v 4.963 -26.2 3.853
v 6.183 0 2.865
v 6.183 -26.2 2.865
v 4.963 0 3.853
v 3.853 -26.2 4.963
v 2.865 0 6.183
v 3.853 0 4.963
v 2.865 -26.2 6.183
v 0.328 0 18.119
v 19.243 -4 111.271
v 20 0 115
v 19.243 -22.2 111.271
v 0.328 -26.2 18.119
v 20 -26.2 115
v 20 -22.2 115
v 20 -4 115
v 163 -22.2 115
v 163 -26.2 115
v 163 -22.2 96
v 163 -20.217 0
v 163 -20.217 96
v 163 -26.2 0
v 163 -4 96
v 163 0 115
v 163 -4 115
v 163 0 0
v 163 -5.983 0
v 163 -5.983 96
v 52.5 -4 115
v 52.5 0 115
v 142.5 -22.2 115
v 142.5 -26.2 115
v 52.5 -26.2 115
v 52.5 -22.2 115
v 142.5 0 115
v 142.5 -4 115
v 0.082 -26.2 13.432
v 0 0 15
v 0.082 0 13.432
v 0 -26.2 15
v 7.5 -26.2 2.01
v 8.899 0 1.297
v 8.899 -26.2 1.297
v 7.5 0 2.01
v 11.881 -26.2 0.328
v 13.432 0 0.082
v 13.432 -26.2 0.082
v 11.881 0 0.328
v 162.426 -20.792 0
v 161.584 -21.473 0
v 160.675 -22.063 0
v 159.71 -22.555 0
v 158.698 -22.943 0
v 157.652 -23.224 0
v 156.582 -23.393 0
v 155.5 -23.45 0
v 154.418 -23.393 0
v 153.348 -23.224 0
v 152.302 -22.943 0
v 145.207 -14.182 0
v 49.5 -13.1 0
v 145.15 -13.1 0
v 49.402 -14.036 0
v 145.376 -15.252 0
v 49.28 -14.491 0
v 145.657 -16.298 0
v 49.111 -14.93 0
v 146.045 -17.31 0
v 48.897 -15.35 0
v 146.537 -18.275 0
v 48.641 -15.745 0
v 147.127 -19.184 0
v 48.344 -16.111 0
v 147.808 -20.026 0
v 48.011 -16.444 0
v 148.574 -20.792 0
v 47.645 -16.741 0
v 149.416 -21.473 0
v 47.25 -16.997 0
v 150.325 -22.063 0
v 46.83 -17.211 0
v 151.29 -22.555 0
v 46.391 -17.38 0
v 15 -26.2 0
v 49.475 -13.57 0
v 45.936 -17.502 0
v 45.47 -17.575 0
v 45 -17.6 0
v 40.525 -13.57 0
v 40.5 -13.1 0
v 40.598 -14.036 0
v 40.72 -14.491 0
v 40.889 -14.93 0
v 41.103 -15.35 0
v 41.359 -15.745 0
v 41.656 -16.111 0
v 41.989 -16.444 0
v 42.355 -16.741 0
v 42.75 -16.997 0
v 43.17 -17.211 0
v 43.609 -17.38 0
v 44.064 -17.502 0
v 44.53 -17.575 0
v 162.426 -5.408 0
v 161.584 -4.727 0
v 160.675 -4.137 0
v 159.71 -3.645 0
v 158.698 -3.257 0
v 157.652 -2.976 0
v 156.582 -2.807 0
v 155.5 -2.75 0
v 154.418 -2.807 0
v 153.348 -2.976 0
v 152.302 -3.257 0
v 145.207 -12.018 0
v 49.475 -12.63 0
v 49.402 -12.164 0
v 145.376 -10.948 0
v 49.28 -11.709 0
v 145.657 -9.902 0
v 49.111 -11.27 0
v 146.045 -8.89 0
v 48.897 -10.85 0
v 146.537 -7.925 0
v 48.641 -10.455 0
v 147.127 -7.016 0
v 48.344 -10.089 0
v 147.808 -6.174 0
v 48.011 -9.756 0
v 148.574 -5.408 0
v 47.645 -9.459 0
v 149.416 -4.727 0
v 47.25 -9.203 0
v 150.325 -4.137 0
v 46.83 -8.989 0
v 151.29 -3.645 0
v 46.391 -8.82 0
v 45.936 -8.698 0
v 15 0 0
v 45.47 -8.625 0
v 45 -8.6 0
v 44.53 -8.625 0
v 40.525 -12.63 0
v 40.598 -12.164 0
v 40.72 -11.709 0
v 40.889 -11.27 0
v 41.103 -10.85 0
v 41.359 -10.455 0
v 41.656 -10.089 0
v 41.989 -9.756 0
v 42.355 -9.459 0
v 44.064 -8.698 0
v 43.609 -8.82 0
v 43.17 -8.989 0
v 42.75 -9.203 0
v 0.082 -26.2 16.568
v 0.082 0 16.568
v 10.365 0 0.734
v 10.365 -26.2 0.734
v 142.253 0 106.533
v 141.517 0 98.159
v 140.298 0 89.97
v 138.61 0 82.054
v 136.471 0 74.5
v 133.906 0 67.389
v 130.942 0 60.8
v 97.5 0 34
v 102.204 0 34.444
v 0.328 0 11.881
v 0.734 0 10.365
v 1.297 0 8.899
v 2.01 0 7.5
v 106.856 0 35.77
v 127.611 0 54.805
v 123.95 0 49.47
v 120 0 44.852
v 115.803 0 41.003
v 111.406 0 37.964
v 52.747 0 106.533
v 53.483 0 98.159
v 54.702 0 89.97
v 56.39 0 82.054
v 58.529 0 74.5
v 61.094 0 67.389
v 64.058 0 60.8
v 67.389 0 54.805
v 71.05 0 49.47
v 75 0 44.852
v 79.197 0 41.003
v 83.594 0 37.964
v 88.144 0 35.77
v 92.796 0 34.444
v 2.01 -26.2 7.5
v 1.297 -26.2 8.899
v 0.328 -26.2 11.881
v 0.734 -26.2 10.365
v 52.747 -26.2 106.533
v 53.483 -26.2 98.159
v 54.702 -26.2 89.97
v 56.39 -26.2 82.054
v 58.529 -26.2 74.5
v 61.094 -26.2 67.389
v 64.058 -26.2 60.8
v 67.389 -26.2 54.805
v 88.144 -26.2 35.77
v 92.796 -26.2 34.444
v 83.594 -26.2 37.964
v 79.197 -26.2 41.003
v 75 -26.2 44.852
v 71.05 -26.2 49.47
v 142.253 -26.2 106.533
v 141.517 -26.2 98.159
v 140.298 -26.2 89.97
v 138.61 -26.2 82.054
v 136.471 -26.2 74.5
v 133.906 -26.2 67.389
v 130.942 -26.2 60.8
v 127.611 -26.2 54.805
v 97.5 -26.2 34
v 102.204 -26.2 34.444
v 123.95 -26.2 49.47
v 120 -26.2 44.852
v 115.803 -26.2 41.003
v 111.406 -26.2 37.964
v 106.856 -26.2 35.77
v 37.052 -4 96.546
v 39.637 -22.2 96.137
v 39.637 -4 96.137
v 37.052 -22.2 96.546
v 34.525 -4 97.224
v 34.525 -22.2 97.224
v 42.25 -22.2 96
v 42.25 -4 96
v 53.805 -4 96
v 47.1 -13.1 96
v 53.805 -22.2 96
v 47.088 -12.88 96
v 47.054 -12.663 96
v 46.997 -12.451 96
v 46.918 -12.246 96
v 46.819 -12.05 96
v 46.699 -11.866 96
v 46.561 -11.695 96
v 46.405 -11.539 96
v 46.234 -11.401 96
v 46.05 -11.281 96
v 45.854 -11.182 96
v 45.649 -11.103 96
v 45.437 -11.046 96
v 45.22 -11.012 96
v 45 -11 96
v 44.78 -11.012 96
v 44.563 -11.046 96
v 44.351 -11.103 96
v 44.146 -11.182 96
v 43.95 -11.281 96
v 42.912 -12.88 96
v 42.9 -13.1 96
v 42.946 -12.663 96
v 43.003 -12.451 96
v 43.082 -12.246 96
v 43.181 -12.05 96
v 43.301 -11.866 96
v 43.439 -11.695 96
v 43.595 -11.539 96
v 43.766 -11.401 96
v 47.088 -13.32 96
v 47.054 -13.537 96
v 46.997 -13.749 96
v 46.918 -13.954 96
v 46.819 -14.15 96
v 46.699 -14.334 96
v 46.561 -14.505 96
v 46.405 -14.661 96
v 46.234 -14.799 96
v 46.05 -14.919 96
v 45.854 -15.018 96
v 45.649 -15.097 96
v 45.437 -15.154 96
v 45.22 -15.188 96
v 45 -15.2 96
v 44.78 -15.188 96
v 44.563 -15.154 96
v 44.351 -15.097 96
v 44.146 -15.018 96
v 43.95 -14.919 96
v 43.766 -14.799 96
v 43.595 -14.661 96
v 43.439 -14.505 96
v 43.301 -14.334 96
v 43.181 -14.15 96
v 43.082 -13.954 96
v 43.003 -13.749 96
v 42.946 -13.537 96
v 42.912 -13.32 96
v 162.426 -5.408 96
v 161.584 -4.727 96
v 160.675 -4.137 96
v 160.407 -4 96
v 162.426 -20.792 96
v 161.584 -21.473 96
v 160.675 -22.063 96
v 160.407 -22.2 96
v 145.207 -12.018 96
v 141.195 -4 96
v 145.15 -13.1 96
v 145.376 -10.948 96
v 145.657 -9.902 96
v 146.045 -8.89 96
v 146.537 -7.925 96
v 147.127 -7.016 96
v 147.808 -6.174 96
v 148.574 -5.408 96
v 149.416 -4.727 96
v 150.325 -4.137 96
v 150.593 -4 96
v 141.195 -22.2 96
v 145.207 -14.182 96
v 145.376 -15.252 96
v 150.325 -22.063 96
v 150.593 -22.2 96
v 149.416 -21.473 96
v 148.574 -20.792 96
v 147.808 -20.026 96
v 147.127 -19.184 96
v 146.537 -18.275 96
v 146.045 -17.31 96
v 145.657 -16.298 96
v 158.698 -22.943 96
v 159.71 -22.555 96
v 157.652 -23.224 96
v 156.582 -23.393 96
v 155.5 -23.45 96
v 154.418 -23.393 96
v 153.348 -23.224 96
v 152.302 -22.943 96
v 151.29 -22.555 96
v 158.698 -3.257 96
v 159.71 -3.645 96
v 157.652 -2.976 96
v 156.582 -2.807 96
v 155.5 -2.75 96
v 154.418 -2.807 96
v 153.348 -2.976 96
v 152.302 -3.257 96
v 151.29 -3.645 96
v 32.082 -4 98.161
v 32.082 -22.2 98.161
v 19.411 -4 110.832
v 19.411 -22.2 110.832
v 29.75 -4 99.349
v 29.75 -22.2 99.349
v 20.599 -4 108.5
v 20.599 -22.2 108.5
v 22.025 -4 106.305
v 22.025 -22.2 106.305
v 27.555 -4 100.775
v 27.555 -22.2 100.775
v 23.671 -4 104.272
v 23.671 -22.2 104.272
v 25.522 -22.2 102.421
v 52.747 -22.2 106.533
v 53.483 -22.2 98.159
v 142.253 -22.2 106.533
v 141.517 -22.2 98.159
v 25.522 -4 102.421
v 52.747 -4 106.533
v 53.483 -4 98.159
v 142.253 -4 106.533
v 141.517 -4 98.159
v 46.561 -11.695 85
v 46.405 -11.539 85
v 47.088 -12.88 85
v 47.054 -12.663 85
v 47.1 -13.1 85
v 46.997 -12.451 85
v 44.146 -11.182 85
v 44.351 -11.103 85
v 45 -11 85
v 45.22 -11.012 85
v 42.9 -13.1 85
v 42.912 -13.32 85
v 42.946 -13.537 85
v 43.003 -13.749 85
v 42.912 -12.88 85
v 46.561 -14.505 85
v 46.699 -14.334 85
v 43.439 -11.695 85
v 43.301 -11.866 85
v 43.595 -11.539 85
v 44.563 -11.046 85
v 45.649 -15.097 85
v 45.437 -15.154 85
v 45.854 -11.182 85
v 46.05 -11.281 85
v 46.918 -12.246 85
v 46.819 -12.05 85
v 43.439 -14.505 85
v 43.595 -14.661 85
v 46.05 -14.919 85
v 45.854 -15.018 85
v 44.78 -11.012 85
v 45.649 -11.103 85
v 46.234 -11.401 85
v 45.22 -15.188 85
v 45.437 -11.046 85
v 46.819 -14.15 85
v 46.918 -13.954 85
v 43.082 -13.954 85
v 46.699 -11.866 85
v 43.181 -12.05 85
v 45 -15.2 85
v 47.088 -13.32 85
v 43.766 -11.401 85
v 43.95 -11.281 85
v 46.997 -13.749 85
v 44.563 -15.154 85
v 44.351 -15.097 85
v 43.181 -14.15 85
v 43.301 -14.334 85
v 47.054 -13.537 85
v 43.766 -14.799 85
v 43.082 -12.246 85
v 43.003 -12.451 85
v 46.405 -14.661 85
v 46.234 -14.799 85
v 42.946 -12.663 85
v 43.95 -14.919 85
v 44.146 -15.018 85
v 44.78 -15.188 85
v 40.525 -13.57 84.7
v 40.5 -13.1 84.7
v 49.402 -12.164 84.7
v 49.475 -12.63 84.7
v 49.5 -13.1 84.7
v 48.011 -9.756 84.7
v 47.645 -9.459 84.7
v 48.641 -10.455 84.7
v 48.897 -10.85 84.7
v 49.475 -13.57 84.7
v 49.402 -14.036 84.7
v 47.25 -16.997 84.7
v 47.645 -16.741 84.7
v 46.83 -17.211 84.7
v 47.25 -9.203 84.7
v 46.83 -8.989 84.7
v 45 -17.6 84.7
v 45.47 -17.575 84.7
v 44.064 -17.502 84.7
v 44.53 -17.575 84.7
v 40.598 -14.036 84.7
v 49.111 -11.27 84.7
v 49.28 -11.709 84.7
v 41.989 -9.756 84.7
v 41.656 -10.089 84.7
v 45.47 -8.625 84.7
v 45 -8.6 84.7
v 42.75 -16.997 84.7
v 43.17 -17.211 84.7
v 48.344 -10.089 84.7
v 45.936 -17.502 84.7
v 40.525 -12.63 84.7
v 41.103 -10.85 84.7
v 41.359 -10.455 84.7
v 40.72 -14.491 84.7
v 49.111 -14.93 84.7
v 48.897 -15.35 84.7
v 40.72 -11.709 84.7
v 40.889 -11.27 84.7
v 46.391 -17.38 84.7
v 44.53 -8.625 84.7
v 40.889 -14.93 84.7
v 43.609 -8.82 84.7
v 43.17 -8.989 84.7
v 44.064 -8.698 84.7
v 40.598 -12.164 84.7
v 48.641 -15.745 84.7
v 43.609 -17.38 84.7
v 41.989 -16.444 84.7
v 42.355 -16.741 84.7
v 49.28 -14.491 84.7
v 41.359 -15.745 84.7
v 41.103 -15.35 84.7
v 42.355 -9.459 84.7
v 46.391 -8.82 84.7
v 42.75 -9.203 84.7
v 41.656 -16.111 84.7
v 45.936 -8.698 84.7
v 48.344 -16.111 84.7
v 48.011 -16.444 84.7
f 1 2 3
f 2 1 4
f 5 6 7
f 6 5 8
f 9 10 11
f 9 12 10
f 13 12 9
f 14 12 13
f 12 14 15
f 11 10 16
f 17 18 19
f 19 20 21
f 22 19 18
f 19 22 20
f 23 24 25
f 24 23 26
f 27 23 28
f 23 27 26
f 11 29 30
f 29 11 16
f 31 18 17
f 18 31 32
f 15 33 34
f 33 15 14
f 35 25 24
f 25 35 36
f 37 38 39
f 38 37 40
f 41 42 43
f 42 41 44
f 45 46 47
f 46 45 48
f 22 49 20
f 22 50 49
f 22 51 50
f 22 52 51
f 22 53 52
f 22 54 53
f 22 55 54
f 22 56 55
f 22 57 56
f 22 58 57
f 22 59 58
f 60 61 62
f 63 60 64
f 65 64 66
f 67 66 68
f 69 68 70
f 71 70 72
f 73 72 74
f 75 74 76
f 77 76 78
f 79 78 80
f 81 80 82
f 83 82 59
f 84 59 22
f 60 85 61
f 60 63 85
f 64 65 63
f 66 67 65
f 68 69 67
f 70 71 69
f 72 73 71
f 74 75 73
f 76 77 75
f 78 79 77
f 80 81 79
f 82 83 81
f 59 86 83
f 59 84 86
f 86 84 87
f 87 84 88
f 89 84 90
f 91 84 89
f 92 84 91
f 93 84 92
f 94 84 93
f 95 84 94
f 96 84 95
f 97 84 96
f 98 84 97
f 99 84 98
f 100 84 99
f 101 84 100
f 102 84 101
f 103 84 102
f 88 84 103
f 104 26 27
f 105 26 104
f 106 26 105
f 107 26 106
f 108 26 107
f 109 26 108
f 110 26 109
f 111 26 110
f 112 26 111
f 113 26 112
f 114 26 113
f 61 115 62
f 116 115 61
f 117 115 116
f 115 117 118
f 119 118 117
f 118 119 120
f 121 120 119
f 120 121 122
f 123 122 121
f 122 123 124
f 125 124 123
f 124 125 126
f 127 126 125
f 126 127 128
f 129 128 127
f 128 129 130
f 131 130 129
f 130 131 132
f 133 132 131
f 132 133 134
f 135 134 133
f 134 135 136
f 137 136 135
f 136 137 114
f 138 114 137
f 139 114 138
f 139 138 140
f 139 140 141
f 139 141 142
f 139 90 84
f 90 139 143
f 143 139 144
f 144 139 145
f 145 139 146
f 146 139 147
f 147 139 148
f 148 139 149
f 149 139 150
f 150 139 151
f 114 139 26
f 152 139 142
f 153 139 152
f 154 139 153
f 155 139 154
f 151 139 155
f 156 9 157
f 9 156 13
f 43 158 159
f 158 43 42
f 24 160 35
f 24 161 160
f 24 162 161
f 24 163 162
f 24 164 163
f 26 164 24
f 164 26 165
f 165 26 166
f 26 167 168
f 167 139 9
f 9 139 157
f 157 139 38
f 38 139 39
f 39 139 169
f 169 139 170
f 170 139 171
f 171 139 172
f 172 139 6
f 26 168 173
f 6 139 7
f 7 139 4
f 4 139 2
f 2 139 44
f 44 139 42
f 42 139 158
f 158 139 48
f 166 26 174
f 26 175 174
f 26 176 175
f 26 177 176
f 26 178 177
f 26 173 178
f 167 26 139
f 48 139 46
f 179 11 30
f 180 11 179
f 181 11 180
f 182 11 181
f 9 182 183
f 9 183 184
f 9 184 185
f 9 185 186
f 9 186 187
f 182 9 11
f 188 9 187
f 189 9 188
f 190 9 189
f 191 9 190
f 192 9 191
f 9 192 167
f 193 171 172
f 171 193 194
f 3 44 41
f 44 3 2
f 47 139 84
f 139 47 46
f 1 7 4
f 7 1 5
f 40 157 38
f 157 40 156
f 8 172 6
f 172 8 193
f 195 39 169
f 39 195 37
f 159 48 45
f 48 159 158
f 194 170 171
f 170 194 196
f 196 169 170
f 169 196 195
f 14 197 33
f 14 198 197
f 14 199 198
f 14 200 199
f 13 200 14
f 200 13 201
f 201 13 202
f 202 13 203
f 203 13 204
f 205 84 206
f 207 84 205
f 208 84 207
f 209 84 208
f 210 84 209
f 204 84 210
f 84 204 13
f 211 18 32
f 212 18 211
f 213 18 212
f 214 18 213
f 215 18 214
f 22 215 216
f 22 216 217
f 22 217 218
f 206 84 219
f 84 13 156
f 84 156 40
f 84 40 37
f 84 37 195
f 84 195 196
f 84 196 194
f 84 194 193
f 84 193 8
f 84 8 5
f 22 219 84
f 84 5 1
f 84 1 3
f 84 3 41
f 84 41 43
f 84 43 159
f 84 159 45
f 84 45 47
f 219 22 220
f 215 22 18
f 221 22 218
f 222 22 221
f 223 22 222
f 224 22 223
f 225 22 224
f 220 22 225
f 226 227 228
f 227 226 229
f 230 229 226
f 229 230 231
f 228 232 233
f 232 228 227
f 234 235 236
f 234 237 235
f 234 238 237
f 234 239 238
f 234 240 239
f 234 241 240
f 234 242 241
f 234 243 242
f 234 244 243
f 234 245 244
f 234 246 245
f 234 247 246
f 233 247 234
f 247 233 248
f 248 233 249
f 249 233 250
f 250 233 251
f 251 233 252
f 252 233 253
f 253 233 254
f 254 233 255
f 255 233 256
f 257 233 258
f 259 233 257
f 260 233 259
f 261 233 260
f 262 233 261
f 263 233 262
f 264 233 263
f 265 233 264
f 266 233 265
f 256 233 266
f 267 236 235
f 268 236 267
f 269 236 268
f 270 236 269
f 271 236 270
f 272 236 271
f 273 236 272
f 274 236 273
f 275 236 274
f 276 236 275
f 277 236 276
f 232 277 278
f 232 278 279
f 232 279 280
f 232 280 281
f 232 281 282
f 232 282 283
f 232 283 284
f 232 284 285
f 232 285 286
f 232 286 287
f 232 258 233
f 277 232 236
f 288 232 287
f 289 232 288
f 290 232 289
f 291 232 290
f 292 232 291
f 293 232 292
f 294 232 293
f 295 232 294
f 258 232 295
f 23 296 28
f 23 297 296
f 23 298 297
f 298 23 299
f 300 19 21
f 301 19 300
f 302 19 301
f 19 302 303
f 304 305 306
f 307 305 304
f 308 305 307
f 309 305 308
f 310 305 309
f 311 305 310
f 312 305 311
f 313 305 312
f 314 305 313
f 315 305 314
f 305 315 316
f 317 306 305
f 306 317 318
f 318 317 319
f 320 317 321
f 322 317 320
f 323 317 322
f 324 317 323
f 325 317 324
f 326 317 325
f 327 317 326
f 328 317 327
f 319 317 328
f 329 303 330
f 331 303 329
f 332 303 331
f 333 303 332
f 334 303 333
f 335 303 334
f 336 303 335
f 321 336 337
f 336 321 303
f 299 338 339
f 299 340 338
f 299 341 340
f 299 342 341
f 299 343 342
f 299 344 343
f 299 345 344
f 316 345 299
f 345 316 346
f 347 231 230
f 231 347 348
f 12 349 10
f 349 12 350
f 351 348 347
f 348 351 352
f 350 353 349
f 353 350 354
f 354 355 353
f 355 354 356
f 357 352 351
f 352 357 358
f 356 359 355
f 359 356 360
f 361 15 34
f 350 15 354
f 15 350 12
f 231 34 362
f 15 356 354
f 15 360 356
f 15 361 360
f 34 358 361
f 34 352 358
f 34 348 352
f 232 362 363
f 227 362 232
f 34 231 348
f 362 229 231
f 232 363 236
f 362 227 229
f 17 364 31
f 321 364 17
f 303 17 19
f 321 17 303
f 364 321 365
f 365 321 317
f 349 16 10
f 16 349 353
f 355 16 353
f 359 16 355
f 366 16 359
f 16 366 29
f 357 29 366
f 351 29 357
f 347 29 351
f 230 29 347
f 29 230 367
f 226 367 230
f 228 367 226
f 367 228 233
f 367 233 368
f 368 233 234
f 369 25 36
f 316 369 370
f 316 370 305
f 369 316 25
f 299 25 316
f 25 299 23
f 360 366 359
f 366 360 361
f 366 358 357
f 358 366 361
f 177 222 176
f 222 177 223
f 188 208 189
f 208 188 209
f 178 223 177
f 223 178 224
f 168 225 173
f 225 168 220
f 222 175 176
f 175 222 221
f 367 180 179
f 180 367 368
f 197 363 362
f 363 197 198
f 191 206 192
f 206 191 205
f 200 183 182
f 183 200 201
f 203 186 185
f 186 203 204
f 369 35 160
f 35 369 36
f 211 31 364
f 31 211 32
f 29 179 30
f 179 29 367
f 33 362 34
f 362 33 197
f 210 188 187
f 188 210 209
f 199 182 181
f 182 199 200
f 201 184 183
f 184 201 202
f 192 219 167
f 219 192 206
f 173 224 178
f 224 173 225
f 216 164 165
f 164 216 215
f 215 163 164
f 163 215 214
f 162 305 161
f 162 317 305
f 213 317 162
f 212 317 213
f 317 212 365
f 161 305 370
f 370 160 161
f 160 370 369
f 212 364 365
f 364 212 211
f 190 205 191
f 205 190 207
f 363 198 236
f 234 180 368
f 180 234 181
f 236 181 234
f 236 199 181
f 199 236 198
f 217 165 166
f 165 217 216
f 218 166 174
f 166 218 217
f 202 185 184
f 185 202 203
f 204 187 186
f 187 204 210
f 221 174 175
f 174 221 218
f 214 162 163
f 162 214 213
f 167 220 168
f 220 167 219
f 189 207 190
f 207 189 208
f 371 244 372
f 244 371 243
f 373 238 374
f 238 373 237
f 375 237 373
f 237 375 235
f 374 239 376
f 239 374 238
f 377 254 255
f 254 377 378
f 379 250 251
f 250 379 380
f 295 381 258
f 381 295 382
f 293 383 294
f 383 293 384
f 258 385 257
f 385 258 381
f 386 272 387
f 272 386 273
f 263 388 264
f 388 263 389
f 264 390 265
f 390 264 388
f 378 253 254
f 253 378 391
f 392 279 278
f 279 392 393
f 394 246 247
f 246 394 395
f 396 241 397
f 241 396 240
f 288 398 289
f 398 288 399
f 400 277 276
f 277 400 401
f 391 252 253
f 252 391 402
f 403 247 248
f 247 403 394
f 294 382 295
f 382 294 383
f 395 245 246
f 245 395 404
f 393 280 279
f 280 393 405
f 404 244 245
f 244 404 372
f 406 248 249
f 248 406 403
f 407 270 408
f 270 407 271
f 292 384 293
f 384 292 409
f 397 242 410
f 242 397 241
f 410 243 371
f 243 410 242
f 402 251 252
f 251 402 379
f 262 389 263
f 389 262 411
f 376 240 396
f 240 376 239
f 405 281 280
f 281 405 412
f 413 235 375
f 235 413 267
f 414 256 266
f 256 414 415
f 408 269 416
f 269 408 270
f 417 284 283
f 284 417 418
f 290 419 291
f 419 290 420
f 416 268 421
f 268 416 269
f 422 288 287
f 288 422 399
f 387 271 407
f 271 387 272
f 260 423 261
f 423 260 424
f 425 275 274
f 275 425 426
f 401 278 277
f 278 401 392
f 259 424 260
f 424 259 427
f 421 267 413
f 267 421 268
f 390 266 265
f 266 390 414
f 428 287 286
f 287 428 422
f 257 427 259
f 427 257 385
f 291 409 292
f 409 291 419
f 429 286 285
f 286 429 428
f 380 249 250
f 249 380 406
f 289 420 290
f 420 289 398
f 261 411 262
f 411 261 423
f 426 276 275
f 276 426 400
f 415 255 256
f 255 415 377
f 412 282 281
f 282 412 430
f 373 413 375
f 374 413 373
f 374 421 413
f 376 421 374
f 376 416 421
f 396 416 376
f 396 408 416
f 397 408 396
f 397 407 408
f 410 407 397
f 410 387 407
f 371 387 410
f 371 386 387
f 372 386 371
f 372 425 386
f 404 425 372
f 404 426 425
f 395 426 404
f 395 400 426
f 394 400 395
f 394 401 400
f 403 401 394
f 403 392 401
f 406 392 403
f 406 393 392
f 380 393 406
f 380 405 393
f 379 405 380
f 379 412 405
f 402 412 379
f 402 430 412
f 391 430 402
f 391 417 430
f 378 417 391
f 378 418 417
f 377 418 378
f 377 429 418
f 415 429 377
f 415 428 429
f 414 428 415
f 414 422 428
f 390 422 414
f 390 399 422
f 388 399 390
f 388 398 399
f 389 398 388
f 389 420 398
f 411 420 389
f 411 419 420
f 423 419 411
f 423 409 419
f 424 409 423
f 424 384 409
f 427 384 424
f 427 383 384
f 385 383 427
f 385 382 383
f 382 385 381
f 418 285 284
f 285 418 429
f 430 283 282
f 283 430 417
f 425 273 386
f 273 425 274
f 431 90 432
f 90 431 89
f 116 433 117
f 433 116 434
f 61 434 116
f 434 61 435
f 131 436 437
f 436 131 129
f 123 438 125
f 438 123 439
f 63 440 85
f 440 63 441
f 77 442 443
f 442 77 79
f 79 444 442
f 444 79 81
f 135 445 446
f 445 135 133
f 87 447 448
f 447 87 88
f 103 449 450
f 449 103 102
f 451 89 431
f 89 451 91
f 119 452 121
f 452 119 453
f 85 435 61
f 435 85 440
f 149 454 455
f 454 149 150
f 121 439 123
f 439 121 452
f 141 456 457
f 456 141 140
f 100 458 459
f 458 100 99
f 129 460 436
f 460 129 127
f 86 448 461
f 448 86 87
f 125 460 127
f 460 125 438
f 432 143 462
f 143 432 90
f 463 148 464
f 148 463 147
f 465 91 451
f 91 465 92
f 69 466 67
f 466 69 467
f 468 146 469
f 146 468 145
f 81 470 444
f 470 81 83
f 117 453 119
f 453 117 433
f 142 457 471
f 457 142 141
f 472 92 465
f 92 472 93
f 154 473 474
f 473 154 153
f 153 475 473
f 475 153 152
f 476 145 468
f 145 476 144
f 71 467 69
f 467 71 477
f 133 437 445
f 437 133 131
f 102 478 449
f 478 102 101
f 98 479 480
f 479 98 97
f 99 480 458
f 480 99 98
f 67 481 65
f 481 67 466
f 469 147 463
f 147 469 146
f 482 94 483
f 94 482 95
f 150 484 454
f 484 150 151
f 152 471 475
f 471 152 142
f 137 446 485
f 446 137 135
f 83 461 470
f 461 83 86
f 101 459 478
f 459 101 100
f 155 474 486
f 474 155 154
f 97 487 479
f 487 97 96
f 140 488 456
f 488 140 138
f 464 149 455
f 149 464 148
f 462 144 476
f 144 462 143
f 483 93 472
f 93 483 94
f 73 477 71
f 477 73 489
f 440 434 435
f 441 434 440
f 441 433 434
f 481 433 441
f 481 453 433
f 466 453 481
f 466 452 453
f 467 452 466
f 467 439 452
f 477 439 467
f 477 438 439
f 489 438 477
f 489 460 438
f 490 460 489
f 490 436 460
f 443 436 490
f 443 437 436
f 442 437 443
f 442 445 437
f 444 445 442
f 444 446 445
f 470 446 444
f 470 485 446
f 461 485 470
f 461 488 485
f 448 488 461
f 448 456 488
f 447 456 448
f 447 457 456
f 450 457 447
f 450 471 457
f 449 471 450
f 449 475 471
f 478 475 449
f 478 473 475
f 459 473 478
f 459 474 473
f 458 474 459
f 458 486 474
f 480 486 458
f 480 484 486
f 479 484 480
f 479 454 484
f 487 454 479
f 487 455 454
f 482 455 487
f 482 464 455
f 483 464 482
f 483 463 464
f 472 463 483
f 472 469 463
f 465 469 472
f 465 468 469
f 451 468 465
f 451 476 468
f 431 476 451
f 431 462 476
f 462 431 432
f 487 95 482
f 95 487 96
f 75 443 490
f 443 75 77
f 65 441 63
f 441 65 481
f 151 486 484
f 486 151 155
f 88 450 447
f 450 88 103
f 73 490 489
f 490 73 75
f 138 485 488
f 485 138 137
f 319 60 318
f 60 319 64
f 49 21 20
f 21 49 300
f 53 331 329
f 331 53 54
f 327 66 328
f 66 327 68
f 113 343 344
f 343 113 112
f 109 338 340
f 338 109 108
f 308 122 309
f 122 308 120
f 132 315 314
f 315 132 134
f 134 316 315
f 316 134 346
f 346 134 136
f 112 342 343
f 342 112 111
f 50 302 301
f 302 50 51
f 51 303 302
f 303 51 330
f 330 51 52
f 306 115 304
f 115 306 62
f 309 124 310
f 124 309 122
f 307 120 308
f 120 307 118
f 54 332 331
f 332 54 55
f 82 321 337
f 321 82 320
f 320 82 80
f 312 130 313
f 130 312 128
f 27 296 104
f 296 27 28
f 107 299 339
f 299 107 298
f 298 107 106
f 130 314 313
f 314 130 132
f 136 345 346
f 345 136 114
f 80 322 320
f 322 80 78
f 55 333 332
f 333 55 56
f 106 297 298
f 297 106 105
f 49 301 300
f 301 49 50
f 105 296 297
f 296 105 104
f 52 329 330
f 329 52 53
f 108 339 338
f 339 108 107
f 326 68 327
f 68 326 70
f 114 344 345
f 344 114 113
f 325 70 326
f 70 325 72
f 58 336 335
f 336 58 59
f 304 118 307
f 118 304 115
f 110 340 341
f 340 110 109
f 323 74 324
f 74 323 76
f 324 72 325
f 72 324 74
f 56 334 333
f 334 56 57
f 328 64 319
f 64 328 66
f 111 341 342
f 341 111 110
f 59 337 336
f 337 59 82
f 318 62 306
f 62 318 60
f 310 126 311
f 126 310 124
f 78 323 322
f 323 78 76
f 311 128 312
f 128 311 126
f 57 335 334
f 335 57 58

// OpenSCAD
frame_w = 18.2;
w = frame_w + 8;
h = 95 + 20;

// flat part
frame_l = 226;

frame_corner_d = 50;

$fn=60;


//debug();
//test_frame();

//front_leg();
back_leg();


module mock_frame() {
    translate([frame_corner_d/2, 0, 0])
    hull() {
        cylinder(d=frame_corner_d, h=frame_w);

        translate([frame_l, 0, 0])
        cylinder(d=frame_corner_d, h=frame_w);
    }
}

module _leg(width=135) {
    difference() {
        hull() {
            translate([30/2, 30/2, 0])
            cylinder(d=30, h=w);

            translate([20, 0, 0])
            cube([width, h, w]);
        }
        translate([42.25, 96, 4])
        hull() {
            translate([0, frame_corner_d/2, 0])
            cylinder(d=frame_corner_d, h=frame_w);

            cube([width*2, 10, frame_w]);
        }
        translate([155/2 + 20, h, 0])
        scale([1, 1.8, 1])
        cylinder(d=90, h=w + 1);

        translate([45, h - 20 - 10, w/2])
        rotate([-90, 0, 0])
        cylinder(d=4.2, h=h);

        translate([45, 0, w/2])
        rotate([-90, 0, 0])
        cylinder(d=9, h=h - 20 - 10.3);
    }
}

module front_leg() {
    rotate([90, 0, 0])
    difference() {
        union() {
            _leg(135 - 8);

            translate([20 + 135, 0, w/2])
            rotate([-90, 0, 0])
            cylinder(d=w - 6, h=h - 19);
        }
        translate([20 + 135, h - 20 - 10, w/2])
        rotate([-90, 0, 0])
        cylinder(d=4.2, h=h);

        translate([20 + 135, 0, w/2])
        rotate([-90, 0, 0])
        cylinder(d=9, h=h - 20 - 10.3);
    }
}

module back_leg() {

    rotate([90, 0, 0])
    difference() {
        _leg(135 + 8);

        translate([20 + 135 + 0.5, 0, w/2])
        rotate([-90, 0, 0])
        cylinder(d=w - 5.5,h=h - 19);
    }
}

module debug() {
    intersection() {
        union() {
            front_leg();

            translate([155*2 + 0.5, -w, 0])
            rotate([0, 0, 180])
            back_leg();
        }
        rotate([90, 0, 0])
        cube([500, 500, w/2]);
    }
    %translate([
        -frame_corner_d/2 + 42.25, 0, h + 6
    ])
    rotate([90, 0, 0])
    mock_frame();
}

module test_frame() {
    
    scale_x = (frame_l + frame_corner_d + 5)/(frame_l +frame_corner_d);
    scale_y = (frame_corner_d + 5)/(frame_corner_d);

    intersection() {
        difference() {
            scale([scale_x, scale_y, 1])
            translate([
                -(frame_l + frame_corner_d)/2,
                0, 0
            ])
            mock_frame();

            translate([
                -(frame_l + frame_corner_d)/2,
                0, 0
            ])
            mock_frame();
        }
        cube([frame_l + frame_corner_d + 10, 50, 20]);
    }
}
